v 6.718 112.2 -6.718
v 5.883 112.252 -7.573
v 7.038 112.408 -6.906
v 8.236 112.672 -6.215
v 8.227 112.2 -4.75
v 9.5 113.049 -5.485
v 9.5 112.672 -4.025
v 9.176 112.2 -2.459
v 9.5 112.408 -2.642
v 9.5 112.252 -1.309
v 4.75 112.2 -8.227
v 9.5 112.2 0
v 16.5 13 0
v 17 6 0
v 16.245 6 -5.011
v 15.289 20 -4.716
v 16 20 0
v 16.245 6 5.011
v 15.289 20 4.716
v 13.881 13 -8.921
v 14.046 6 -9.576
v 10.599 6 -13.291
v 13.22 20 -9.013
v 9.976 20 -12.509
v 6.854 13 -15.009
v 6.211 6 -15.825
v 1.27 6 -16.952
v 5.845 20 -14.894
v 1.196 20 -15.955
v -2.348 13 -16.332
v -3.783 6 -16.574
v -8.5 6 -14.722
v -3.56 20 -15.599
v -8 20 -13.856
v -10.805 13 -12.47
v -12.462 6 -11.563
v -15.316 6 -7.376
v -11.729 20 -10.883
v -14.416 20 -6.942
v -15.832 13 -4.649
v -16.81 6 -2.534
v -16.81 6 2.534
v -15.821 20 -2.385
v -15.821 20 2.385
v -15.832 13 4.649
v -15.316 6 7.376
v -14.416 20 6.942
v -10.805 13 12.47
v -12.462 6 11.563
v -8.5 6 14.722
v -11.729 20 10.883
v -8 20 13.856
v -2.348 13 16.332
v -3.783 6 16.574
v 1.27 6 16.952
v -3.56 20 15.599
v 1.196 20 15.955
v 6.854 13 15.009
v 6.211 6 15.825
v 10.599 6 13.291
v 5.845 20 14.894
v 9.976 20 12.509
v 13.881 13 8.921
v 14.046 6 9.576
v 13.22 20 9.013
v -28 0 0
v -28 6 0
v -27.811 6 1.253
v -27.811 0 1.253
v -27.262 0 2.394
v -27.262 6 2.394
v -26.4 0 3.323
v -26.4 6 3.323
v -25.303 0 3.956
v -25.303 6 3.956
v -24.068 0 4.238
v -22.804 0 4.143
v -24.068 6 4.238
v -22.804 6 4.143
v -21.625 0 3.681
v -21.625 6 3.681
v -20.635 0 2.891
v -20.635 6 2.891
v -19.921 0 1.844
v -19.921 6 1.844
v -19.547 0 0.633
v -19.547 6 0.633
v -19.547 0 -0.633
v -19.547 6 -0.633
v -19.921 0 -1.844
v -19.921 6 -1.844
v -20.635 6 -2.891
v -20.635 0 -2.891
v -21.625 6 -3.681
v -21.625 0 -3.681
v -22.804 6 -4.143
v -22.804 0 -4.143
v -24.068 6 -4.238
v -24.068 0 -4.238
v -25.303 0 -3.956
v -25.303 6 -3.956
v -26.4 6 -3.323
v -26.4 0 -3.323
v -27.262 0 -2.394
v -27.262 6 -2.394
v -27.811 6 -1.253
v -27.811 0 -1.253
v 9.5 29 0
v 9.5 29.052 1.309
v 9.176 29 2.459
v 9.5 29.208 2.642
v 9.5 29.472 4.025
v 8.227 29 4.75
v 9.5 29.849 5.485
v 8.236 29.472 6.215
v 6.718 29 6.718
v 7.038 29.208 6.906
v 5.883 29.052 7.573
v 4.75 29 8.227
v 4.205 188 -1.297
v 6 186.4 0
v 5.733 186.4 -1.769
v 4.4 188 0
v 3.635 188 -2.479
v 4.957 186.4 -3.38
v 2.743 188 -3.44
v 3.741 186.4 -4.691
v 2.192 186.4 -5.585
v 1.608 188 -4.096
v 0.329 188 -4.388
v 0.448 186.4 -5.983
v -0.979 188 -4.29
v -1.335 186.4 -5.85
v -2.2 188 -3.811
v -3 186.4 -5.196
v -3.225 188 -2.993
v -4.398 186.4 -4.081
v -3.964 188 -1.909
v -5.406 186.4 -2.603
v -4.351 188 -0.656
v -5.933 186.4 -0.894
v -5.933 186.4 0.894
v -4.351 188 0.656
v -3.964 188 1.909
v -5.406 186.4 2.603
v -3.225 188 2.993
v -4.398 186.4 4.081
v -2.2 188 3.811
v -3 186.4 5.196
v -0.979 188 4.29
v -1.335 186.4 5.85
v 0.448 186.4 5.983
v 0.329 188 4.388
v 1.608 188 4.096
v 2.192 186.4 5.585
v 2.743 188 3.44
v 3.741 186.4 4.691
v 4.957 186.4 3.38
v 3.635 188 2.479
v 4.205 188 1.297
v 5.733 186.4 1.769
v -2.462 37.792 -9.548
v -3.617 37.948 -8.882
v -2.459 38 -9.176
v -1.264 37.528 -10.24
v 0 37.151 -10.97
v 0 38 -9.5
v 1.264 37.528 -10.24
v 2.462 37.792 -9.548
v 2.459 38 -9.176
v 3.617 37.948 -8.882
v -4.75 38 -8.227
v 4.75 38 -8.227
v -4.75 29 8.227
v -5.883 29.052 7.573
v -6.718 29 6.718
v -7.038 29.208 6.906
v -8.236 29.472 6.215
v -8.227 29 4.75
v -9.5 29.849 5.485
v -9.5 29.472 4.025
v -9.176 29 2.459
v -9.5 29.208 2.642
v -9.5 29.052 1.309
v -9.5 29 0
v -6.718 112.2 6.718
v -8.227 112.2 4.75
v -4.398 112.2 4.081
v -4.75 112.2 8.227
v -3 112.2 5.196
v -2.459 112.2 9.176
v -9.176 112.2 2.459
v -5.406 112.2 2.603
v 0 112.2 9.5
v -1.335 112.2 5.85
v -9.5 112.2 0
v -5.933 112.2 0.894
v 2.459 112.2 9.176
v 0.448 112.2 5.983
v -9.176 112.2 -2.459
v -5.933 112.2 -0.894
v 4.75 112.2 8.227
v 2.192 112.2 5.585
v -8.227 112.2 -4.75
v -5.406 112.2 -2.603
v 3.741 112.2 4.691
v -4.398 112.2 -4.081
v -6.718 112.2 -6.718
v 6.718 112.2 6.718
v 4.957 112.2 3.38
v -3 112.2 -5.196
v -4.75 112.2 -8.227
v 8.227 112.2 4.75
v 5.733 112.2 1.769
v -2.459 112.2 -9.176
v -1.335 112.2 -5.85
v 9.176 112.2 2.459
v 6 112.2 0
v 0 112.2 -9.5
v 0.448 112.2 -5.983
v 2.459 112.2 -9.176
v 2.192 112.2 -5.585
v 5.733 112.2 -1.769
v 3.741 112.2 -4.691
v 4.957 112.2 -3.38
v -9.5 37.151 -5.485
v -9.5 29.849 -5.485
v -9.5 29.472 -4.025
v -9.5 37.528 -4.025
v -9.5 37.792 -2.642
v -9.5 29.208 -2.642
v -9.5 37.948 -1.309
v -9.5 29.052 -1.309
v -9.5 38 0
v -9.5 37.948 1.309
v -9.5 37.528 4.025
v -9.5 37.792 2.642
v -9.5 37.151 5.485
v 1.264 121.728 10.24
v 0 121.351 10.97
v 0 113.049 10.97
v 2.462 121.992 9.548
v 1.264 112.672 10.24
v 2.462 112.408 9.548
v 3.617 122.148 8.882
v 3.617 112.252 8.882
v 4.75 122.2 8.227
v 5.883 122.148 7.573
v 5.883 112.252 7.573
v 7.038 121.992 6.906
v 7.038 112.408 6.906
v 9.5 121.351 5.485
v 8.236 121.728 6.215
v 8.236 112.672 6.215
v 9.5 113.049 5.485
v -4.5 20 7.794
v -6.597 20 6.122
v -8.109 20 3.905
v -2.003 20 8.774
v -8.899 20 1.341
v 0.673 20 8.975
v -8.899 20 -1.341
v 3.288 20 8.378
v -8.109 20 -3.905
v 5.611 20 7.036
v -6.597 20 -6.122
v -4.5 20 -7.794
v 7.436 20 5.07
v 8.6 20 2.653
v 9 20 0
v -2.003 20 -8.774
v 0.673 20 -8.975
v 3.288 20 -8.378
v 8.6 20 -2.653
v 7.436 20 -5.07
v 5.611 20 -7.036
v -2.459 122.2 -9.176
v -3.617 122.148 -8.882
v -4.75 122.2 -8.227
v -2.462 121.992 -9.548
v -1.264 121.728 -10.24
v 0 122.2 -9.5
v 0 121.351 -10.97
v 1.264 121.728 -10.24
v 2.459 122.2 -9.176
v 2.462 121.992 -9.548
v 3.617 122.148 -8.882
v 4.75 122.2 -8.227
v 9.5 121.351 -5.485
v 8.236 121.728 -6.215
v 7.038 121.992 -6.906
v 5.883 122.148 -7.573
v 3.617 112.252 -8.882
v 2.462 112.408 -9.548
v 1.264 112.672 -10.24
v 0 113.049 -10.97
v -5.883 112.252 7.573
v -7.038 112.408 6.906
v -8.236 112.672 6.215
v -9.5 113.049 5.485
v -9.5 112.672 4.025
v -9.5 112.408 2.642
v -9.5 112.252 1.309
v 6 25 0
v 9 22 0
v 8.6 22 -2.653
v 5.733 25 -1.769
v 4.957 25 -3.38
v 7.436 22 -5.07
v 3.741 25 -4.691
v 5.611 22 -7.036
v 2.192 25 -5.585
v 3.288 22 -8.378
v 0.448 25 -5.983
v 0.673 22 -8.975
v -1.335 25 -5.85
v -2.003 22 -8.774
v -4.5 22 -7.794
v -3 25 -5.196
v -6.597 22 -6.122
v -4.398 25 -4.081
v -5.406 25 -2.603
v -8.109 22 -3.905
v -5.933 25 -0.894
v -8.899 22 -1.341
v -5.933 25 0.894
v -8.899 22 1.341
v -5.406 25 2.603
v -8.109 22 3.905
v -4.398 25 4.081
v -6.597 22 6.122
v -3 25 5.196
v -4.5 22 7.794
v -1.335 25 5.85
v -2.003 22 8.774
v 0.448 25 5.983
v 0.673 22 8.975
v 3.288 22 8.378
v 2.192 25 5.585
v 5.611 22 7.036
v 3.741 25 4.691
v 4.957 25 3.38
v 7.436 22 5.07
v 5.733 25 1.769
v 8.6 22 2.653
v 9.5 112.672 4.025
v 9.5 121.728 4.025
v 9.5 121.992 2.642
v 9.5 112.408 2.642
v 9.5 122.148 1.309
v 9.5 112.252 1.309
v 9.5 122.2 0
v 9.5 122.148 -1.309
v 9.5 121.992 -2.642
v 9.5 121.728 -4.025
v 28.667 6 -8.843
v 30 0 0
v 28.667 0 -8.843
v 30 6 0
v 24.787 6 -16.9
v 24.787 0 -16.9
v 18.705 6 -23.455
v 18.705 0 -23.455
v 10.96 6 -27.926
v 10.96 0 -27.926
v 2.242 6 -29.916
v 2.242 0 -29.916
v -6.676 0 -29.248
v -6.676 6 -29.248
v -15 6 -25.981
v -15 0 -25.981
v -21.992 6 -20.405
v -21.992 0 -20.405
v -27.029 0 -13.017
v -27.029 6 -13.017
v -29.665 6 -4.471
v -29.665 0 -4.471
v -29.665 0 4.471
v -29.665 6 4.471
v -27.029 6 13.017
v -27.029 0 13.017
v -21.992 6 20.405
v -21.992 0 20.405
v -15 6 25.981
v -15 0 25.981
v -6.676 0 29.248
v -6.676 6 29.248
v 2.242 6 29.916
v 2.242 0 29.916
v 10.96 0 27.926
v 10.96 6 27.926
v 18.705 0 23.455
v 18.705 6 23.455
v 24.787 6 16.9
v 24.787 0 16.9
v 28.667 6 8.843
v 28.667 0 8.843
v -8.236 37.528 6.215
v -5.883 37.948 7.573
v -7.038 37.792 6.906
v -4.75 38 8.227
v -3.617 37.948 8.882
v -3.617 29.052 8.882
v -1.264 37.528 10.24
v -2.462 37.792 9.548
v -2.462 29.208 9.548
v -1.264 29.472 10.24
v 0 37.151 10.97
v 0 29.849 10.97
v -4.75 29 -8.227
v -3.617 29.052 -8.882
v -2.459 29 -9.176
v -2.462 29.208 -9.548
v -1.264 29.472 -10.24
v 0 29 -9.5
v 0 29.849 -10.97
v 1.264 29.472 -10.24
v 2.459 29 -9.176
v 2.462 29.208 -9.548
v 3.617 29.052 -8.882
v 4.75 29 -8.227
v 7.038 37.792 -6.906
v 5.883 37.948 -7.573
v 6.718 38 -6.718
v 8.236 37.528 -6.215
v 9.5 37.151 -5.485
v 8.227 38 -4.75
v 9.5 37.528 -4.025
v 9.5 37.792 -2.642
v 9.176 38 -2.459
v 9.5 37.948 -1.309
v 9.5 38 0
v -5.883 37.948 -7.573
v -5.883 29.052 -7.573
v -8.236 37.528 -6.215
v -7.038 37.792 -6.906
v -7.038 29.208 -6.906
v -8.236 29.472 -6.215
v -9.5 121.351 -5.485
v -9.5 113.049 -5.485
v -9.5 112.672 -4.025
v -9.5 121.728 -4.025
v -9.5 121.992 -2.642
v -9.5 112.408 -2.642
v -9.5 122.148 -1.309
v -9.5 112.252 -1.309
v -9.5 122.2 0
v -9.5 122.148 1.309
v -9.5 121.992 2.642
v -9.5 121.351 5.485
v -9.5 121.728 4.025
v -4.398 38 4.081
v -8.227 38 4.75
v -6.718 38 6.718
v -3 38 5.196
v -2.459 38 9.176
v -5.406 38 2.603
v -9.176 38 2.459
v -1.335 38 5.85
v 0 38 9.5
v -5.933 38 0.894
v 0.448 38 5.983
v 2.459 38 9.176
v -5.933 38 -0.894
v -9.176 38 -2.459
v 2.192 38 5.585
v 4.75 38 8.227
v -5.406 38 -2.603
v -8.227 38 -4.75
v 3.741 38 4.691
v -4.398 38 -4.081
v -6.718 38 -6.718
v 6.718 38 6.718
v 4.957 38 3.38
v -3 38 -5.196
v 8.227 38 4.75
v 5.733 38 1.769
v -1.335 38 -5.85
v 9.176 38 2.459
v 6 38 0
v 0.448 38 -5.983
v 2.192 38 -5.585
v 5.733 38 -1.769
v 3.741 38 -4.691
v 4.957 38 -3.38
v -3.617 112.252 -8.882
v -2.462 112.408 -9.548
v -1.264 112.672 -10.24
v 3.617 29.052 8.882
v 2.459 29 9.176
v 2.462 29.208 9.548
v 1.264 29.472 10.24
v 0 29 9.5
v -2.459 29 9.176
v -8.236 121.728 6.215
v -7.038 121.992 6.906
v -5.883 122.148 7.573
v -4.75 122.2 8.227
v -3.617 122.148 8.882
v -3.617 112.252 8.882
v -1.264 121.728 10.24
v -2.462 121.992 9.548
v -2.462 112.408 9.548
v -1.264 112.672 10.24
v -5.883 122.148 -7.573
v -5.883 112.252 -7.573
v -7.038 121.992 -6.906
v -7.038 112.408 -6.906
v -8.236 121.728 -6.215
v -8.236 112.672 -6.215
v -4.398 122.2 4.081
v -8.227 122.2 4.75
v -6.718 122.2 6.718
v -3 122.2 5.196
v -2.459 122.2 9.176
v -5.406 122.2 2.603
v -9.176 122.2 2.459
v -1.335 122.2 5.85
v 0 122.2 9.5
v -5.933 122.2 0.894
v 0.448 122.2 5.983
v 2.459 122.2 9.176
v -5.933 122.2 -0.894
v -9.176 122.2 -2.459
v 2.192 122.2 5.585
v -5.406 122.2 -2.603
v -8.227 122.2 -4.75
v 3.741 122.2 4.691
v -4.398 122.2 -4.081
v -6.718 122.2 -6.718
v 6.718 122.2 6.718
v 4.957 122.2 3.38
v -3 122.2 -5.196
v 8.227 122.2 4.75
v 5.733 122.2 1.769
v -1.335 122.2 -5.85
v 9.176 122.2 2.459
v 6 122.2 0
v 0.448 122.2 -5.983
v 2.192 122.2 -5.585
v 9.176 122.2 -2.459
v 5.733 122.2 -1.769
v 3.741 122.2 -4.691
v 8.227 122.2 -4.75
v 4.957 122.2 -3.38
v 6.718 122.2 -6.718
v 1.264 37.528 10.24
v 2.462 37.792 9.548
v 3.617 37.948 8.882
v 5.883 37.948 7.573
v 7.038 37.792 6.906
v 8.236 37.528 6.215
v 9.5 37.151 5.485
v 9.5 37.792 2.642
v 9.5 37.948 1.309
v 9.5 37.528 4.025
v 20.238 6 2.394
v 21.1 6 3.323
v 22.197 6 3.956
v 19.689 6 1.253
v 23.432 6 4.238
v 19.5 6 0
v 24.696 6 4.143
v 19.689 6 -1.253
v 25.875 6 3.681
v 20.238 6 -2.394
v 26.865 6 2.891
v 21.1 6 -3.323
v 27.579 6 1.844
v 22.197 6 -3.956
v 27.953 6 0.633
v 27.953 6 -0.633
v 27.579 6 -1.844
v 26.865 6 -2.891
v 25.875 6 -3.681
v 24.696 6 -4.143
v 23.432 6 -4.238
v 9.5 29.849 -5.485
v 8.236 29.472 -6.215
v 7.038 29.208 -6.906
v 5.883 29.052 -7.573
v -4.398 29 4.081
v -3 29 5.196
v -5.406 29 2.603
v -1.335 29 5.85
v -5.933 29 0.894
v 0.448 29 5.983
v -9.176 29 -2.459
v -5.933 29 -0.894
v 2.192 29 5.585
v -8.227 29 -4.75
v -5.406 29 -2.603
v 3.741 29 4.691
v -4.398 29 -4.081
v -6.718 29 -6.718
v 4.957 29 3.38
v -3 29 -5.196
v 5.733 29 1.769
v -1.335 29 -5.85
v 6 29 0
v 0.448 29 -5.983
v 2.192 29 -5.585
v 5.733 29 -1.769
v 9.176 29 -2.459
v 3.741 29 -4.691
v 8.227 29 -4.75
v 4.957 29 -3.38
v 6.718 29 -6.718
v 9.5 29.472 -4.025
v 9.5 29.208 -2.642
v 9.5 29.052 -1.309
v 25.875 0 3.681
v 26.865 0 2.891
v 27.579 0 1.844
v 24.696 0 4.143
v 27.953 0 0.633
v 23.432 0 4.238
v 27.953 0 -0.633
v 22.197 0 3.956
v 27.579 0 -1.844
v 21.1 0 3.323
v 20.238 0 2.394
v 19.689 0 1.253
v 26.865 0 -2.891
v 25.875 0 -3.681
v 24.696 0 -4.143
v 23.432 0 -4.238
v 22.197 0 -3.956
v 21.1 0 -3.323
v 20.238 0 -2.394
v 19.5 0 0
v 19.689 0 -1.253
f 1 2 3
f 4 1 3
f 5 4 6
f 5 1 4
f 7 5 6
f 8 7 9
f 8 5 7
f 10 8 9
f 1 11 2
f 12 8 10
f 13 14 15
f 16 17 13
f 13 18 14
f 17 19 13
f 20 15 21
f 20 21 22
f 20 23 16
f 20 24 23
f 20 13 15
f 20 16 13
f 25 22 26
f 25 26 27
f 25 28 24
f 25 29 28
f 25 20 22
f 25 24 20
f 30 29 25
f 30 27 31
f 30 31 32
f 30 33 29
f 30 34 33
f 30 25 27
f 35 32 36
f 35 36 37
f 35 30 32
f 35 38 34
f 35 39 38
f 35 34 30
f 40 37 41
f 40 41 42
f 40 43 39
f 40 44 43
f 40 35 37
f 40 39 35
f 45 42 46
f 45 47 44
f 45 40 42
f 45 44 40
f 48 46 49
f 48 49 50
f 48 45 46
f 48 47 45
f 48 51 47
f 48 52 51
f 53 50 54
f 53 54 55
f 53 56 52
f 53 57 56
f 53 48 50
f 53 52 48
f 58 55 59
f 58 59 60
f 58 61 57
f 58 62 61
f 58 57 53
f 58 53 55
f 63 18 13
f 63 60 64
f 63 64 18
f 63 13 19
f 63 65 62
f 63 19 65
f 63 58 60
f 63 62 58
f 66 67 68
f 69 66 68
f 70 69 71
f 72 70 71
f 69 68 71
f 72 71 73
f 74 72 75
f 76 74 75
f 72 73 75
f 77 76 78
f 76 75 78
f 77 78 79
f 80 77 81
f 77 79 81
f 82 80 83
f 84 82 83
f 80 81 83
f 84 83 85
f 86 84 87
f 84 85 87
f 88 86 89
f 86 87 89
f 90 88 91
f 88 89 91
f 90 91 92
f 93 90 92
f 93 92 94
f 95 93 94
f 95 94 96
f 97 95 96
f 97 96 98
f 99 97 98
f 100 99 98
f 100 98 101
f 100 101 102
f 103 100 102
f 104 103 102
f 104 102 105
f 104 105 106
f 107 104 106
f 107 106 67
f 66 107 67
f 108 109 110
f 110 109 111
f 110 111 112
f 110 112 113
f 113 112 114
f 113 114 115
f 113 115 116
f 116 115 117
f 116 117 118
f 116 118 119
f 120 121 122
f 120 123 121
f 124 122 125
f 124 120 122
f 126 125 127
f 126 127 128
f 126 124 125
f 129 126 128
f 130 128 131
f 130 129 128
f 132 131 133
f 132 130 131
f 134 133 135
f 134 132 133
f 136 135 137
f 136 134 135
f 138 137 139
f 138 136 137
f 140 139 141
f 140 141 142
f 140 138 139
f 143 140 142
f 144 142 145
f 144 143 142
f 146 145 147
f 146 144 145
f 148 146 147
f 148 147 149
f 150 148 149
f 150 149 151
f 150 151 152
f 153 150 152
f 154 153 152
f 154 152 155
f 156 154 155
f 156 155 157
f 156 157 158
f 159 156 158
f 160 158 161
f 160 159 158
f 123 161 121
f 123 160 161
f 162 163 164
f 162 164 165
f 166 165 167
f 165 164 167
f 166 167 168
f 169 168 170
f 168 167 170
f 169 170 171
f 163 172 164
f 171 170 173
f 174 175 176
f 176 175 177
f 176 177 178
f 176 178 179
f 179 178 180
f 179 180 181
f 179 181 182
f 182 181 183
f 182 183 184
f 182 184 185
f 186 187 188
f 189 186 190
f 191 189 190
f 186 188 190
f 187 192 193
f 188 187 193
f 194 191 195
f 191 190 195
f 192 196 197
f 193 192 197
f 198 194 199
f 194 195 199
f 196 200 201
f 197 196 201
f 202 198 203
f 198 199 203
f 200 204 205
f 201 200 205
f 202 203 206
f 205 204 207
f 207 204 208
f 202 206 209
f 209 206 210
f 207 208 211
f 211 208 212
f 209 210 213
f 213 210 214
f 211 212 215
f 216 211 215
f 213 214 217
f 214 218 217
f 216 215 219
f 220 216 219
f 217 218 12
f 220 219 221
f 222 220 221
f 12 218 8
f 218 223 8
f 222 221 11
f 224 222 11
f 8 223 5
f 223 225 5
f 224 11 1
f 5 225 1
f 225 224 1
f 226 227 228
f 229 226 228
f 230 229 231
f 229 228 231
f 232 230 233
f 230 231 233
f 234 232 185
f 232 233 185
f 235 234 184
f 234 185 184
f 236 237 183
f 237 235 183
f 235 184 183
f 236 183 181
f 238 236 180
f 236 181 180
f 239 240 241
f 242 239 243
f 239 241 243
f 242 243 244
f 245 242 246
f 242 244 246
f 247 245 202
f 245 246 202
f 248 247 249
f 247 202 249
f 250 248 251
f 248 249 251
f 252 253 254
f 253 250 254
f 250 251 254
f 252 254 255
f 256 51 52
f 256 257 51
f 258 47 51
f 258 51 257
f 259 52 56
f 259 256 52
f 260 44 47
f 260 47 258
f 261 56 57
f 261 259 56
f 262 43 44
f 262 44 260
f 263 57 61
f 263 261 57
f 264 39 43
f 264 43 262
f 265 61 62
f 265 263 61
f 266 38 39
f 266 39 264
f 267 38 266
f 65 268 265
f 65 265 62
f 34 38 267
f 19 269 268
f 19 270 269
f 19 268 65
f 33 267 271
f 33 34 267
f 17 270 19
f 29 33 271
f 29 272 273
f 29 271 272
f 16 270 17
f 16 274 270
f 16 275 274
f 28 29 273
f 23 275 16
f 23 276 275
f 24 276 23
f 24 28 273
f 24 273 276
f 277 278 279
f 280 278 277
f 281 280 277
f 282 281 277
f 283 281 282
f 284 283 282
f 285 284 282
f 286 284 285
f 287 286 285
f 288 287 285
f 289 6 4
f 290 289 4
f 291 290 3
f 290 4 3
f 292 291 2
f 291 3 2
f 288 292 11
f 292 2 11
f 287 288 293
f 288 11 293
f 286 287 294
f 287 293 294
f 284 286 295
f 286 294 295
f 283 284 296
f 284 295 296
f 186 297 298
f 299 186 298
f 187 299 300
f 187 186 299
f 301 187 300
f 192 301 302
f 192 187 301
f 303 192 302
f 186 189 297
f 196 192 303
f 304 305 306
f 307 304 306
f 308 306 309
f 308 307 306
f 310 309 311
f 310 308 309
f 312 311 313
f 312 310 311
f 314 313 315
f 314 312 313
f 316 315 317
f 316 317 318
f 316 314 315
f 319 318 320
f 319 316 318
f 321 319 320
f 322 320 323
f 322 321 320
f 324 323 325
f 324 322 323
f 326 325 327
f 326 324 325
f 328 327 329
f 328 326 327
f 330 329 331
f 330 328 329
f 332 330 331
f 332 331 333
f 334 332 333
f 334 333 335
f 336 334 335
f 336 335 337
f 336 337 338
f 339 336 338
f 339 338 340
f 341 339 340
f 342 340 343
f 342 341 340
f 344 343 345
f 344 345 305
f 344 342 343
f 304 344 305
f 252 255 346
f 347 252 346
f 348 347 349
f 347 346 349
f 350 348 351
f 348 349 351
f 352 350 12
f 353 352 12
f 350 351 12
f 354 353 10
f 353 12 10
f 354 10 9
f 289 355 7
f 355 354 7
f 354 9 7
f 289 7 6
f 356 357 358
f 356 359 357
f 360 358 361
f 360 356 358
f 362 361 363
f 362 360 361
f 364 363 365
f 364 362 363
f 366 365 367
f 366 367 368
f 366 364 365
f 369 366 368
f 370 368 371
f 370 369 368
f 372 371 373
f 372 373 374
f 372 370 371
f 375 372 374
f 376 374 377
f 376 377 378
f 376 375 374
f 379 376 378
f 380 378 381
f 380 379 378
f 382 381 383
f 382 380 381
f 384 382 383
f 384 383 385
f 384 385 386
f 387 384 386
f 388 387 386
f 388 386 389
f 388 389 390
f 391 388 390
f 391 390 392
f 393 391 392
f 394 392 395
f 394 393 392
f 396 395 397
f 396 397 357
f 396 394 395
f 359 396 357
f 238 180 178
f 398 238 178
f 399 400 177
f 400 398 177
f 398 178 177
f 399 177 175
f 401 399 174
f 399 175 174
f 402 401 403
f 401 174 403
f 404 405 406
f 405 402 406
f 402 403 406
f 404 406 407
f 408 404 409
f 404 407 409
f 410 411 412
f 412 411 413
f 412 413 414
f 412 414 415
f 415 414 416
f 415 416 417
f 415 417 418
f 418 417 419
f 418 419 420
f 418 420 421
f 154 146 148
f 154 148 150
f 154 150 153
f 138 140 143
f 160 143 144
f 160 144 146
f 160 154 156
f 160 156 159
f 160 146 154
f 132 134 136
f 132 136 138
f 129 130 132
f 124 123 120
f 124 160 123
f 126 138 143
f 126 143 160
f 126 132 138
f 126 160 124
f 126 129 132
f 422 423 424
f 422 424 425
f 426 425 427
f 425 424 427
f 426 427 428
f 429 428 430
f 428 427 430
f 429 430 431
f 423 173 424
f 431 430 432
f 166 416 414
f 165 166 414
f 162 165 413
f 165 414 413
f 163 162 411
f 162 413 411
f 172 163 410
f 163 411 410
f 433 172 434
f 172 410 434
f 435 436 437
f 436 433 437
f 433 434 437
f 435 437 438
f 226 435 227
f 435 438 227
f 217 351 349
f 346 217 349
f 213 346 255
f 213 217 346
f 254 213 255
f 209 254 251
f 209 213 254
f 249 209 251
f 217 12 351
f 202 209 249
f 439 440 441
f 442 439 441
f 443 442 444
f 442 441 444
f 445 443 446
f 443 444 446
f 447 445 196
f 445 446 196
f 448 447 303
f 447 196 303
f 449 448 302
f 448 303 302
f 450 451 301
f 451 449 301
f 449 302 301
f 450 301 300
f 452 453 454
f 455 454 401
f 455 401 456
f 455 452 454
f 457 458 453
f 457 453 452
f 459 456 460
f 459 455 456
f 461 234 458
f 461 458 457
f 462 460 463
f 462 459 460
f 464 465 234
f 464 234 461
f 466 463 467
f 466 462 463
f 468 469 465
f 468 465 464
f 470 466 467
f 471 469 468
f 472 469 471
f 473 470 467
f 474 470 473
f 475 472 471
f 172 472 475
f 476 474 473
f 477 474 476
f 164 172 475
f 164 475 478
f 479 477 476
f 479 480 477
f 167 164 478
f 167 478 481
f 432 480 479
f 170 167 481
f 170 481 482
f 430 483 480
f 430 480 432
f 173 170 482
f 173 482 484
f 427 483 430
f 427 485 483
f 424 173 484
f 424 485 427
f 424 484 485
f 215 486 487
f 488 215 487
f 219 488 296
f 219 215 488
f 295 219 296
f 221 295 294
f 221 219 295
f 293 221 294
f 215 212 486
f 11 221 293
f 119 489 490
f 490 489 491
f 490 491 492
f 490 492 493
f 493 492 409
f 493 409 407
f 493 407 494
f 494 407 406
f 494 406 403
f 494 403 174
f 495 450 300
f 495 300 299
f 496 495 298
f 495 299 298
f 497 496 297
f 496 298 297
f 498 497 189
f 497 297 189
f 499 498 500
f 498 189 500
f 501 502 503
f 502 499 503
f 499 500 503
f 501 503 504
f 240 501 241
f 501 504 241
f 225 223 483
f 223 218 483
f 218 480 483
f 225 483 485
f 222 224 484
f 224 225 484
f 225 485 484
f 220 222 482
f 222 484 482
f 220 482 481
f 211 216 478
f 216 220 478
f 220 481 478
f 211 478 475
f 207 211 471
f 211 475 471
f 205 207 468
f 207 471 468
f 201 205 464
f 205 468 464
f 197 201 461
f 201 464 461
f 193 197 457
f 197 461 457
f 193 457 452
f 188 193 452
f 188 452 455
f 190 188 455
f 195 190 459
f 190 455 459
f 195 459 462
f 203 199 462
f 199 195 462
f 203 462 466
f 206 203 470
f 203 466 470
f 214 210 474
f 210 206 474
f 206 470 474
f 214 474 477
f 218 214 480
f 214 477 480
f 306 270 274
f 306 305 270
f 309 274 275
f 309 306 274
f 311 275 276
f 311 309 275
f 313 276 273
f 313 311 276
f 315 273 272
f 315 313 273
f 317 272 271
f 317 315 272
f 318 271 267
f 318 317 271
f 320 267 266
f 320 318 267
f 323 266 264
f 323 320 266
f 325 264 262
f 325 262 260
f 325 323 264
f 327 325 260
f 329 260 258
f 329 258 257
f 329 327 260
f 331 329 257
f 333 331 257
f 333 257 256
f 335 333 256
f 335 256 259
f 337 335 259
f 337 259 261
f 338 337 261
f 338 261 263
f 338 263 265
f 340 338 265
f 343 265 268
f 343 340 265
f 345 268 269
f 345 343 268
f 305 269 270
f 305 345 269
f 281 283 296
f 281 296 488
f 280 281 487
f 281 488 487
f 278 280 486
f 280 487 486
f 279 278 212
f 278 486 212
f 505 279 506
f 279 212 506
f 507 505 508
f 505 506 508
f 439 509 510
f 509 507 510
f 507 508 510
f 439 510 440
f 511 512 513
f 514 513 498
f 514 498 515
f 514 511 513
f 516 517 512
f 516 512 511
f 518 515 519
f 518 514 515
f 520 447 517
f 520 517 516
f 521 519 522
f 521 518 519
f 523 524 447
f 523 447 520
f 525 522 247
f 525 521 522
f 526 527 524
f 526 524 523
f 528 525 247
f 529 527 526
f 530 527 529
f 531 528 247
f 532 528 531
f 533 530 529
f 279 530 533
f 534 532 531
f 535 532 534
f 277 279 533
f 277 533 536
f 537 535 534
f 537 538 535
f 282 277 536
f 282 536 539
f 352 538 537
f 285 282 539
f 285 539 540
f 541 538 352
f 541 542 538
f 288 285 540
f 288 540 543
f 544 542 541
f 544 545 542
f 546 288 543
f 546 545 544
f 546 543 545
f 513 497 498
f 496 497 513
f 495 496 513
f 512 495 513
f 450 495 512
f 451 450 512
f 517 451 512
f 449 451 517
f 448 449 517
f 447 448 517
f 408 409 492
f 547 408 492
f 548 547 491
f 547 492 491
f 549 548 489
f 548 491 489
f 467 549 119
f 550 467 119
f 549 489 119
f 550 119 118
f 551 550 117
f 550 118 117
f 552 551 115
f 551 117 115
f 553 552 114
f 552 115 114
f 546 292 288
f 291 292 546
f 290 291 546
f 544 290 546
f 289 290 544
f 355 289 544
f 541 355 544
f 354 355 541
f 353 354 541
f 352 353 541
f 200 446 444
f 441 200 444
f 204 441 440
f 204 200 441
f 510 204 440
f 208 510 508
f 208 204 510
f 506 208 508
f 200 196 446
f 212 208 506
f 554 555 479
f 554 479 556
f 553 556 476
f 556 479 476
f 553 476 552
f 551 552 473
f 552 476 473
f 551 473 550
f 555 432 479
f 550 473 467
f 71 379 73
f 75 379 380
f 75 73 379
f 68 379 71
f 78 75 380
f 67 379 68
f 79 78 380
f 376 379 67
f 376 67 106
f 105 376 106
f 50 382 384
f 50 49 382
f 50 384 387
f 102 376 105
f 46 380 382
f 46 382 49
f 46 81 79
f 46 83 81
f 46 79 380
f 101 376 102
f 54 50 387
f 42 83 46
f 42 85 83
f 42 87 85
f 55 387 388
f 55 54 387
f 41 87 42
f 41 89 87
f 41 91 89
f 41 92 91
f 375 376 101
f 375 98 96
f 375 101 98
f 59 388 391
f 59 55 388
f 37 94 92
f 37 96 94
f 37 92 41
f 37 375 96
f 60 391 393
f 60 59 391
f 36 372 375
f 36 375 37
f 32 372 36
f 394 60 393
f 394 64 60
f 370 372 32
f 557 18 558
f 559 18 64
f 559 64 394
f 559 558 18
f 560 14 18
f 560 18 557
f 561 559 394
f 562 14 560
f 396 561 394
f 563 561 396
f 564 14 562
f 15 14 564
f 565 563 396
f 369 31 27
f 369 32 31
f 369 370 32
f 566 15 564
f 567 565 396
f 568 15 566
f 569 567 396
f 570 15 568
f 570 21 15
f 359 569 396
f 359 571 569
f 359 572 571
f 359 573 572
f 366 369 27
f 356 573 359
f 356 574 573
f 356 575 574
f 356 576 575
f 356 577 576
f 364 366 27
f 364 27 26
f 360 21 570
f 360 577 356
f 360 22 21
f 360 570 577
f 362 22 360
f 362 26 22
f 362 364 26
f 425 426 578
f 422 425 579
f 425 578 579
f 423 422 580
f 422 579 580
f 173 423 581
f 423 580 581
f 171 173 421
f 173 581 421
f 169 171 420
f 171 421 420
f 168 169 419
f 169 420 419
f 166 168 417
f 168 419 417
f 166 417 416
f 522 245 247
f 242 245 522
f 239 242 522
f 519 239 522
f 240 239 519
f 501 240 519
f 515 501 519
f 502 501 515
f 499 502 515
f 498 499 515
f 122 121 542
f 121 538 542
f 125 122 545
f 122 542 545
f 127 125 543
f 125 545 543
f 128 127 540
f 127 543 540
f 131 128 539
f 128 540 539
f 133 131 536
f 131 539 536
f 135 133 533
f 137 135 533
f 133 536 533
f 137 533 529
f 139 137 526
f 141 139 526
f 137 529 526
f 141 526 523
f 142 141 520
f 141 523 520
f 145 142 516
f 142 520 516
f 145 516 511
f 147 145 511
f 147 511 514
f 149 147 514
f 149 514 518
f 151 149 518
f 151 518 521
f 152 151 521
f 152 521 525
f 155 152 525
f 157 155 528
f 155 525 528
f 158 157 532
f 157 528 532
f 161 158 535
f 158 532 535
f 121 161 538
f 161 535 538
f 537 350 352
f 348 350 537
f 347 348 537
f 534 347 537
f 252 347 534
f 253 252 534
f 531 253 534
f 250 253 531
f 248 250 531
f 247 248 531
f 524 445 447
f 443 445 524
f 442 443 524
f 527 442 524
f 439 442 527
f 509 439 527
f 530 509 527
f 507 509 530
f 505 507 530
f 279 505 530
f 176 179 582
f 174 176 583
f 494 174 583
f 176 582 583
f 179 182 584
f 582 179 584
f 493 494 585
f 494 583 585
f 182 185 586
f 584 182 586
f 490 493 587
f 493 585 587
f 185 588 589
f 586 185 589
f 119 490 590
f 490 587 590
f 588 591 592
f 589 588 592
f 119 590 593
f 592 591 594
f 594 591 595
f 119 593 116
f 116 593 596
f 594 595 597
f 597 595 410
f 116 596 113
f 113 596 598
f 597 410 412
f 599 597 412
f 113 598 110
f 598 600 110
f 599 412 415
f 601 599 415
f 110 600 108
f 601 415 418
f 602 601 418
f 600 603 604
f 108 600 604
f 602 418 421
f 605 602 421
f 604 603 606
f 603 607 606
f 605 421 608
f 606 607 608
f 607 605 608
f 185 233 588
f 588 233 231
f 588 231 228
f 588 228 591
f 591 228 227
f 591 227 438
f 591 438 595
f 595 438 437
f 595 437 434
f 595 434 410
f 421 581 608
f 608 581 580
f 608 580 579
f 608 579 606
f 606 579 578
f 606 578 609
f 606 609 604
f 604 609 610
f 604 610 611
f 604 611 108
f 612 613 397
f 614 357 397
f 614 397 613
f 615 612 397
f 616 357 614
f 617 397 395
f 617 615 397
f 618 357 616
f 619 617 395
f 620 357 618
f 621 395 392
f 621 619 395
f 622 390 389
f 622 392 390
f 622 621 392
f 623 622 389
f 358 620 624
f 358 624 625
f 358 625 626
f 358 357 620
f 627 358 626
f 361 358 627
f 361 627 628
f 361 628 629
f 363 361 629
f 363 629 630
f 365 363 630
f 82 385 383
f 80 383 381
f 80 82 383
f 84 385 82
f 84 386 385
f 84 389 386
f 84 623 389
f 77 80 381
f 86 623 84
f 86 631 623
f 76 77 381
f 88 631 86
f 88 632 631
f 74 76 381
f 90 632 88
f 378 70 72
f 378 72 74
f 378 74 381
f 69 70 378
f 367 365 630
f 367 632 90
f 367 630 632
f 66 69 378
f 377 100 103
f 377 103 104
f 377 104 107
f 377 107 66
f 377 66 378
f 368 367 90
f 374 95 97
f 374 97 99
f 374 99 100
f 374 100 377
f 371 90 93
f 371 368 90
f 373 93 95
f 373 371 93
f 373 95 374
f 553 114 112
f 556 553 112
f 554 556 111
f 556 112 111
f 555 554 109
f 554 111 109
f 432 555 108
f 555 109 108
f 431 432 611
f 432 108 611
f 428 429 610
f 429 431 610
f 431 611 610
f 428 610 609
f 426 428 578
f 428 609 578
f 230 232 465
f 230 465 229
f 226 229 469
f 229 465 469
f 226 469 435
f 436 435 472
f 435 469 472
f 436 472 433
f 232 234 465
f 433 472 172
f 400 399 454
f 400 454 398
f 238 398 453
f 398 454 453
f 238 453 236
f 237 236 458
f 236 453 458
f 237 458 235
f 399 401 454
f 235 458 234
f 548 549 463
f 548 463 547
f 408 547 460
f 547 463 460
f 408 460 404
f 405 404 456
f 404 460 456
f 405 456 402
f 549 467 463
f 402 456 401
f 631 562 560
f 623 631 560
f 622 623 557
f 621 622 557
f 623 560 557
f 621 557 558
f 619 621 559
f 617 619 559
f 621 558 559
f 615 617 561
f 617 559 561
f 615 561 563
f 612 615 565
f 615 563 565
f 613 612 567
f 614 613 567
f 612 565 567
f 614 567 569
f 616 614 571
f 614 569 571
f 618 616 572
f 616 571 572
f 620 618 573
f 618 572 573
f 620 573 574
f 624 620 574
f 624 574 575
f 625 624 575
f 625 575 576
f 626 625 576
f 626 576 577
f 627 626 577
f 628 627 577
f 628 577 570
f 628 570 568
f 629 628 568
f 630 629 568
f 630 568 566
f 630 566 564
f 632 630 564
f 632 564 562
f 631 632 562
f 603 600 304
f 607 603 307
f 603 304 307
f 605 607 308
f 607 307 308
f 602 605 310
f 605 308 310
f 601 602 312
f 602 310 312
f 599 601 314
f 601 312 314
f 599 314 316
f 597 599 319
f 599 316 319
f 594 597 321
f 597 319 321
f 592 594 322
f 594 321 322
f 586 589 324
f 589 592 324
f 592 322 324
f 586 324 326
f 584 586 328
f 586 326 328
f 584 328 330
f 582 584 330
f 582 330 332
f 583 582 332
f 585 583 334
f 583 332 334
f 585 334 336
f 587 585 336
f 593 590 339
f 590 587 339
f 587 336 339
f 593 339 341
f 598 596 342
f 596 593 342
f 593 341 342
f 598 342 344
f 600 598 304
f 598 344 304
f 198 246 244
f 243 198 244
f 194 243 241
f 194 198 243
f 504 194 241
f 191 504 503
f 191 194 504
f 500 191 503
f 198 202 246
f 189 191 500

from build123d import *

# Parameters (mm, degrees)
EXTRUDE_1_DEPTH     = 9
EXTRUDE_2_DEPTH     = 10
SKETCH_5_R          = 4.25
CUT_EXTRUDE_1_DEPTH = 7


with BuildPart() as part:
    # Эскиз1 → Повернуть1 (revolve)
    with BuildSketch(Plane.XY, mode=Mode.PRIVATE) as revolve_1_sk:
        Polygon((0, 0), (-30, 0), (-30, 6), (-17, 6), (-16, 20), (-9, 20), (-9, 22), (-6, 25), (-6, 29), (-6, 38), (-6, 186.4), (-4.4, 188), (0, 188), align=None)
    revolve(revolve_1_sk.sketch.rotate(Axis((0, 0, 0), (0, 1, 0)), 180), axis=Axis((0, 0, 0), (0, 1, 0)))  # turned: the seam where the file's is

    # Эскиз2 → Бобышка-Вытянуть1 (add)
    with BuildSketch(Plane(origin=(0, 29, 0), x_dir=(1, 0, 0), z_dir=(0, 1, 0))):
        Polygon((0, 10.969655115), (-9.5, 5.484827557), (-9.5, -5.484827557), (0, -10.969655115), (9.5, -5.484827557), (9.5, 5.484827557), align=None)
    extrude(amount=EXTRUDE_1_DEPTH)

    # Эскиз3 → Бобышка-Вытянуть2 (add)
    with BuildSketch(Plane(origin=(0, 112.2, 0), x_dir=(1, 0, 0), z_dir=(0, 1, 0))):
        Polygon((9.5, 5.484827557), (0, 10.969655115), (-9.5, 5.484827557), (-9.5, -5.484827557), (0, -10.969655115), (9.5, -5.484827557), align=None)
    extrude(amount=EXTRUDE_2_DEPTH)

    # Эскиз4 → Вырез-Повернуть2 (revolve, cut)
    with BuildSketch(Plane.XY, mode=Mode.PRIVATE) as cut_revolve_2_sk:
        Polygon((-18.160254038, 122.2), (-9.5, 122.2), (-18.160254038, 117.2), align=None)
        Polygon((-18.160254038, 112.2), (-18.160254038, 117.2), (-9.5, 112.2), align=None)
        Polygon((-17.294228634, 38), (-17.294228634, 33.5), (-9.5, 38), align=None)
        Polygon((-17.294228634, 33.5), (-17.294228634, 29), (-9.5, 29), align=None)
    revolve(cut_revolve_2_sk.sketch.rotate(Axis((0, 188, 0), (0, -1, 0)), 180), axis=Axis((0, 188, 0), (0, -1, 0)), mode=Mode.SUBTRACT)  # turned: the seam where the file's is

    # Эскиз5 → Вырез-Вытянуть1 (cut, through all)
    with BuildSketch(Plane(origin=(0, 6, 0), x_dir=(1, 0, 0), z_dir=(0, 1, 0))):
        with Locations(Location((-23.75, 0, 0), (0, 0, 180))):  # turned: the seam where the file's is
            Circle(SKETCH_5_R)
        with Locations(Location((23.75, 0, 0), (0, 0, 180))):  # turned: the seam where the file's is
            Circle(SKETCH_5_R)
    extrude(amount=-CUT_EXTRUDE_1_DEPTH, mode=Mode.SUBTRACT)


solid = part.part
